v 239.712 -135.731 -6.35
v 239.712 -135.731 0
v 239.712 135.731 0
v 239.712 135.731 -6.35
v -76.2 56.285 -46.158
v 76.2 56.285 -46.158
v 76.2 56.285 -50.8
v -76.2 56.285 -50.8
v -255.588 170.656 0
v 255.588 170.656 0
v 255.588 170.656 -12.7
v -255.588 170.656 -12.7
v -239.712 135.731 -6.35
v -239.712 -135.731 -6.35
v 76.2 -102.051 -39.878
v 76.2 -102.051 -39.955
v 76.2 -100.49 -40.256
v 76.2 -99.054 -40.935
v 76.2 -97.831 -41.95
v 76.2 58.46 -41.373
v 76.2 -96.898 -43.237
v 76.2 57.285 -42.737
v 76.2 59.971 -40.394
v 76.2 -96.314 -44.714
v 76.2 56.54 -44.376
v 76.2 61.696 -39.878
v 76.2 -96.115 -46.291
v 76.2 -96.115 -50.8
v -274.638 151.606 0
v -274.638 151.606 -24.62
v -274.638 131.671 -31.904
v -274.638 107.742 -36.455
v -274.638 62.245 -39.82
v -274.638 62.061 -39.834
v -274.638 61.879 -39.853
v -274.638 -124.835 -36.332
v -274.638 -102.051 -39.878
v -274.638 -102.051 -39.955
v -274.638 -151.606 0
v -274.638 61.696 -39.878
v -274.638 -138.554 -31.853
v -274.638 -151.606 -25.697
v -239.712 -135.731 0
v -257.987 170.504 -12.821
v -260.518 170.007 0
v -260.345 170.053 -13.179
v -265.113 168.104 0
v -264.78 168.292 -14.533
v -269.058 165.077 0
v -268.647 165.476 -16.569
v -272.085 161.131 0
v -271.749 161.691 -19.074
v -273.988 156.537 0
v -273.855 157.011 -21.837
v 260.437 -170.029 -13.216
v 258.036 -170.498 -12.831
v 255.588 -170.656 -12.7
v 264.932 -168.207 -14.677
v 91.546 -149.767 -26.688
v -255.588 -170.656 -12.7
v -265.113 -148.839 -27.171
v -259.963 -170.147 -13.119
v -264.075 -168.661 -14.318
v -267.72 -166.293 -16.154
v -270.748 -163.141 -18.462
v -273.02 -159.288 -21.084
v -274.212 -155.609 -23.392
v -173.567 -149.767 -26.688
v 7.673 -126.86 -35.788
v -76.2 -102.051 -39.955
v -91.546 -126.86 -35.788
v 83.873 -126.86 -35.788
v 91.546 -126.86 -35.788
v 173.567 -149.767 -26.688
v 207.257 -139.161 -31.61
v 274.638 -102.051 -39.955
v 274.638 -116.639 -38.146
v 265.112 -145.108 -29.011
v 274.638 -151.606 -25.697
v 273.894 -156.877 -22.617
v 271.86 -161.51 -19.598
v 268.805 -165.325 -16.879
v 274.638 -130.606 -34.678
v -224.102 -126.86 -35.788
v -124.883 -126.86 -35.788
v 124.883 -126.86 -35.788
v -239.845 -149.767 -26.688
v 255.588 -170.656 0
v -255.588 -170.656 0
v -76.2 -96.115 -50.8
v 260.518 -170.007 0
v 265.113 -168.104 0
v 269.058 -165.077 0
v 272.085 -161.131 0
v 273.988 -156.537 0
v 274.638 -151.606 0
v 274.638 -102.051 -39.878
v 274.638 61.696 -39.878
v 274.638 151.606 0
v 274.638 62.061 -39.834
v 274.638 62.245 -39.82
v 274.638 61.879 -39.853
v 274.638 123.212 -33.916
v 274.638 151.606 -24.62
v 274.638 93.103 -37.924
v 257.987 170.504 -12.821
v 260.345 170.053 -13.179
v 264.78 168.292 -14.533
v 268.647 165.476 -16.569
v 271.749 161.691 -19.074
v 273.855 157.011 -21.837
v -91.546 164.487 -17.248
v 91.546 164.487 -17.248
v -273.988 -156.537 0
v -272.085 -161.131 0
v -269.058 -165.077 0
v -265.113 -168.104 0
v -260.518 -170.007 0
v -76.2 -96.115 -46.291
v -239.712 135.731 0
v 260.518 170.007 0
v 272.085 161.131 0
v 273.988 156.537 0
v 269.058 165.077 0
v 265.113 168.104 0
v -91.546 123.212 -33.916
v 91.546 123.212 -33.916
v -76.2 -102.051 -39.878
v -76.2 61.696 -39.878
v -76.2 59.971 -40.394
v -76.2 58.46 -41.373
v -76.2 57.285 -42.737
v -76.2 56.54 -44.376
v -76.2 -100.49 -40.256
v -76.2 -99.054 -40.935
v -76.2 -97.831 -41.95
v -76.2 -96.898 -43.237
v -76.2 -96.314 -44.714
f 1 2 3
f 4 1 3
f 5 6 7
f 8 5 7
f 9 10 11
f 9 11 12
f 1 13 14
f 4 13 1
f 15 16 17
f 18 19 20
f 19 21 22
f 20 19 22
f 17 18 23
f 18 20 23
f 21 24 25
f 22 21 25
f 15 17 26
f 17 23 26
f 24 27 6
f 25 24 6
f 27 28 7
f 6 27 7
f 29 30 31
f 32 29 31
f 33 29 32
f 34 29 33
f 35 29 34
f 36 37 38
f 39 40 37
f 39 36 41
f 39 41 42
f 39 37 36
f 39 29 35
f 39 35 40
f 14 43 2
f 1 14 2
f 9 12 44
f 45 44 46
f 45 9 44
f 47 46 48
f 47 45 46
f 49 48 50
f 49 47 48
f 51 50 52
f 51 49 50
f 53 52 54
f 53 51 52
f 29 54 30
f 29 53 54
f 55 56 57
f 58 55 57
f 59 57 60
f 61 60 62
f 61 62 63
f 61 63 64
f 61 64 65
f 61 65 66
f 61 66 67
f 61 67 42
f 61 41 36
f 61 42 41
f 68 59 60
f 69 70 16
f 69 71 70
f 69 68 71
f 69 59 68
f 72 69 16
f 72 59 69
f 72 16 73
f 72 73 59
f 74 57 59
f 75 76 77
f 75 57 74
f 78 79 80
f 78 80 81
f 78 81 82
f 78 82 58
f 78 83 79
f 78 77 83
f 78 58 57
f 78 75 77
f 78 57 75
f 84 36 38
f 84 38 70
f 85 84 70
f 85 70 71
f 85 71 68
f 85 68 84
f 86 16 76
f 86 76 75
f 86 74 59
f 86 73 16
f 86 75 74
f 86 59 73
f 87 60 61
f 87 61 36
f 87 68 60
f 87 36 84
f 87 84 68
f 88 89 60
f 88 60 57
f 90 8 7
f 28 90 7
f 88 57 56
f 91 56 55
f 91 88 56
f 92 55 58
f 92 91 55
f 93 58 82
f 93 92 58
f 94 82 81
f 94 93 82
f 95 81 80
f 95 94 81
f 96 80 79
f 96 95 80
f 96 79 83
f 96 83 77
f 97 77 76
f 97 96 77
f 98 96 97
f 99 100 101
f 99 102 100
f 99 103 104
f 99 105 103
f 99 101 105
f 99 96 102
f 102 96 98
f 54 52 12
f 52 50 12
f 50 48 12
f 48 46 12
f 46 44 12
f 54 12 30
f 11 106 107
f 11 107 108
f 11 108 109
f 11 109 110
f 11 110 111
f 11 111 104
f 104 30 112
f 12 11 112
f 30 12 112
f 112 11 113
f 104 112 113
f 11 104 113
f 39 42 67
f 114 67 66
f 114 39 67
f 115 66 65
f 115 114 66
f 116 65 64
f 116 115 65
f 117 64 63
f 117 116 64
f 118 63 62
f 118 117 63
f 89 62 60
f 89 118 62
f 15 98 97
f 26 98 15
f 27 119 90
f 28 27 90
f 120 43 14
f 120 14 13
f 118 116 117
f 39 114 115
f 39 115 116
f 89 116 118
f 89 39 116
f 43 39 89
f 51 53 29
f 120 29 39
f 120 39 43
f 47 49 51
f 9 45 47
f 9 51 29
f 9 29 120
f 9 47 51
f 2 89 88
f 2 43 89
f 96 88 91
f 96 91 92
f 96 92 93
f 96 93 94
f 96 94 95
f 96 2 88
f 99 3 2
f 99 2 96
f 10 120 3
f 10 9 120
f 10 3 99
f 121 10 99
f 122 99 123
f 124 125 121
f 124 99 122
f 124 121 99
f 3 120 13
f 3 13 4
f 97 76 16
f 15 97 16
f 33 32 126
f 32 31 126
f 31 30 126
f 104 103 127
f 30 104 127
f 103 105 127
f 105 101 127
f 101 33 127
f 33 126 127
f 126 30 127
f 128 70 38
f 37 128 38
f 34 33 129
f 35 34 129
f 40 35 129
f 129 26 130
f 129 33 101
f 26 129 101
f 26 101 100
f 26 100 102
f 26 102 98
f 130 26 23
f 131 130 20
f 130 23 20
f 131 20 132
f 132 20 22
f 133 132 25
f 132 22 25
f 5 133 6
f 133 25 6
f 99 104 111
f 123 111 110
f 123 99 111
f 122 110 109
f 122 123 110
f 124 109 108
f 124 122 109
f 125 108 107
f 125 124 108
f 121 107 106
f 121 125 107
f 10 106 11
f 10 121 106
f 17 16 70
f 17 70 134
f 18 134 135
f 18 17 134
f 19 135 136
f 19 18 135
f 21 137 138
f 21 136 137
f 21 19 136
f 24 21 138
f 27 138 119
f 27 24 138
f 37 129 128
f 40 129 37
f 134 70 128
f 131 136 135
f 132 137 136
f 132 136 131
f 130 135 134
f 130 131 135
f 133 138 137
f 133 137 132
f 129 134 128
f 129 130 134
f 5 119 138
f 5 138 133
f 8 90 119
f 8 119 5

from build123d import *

# Parameters (mm, degrees)
BOSS_EXTRUDE1_DEPTH = 50.8
SKETCH2_W           = 479.425
SKETCH2_H           = 271.4625
CUT_EXTRUDE1_DEPTH  = 6.35
CUT_EXTRUDE2_DEPTH  = 762
SKETCH6_W           = 198.4375
SKETCH6_H           = 164.295373215
CUT_EXTRUDE3_DEPTH  = 10.922


with BuildPart() as part:
    # Sketch1 → Boss-Extrude1 (new body)
    with BuildSketch(Plane.XY):
        with BuildLine():
            Line((-255.5875, -170.65625), (255.5875, -170.65625))
            ThreePointArc((255.5875, -170.65625), (269.057884182, -165.076634182), (274.6375, -151.60625))
            Line((274.6375, -151.60625), (274.6375, 151.60625))
            ThreePointArc((274.6375, 151.60625), (269.057884182, 165.076634182), (255.5875, 170.65625))
            Line((255.5875, 170.65625), (-255.5875, 170.65625))
            ThreePointArc((-255.5875, 170.65625), (-269.057884182, 165.076634182), (-274.6375, 151.60625))
            Line((-274.6375, 151.60625), (-274.6375, -151.60625))
            ThreePointArc((-274.6375, -151.60625), (-269.057884182, -165.076634182), (-255.5875, -170.65625))
        make_face()
    extrude(amount=-BOSS_EXTRUDE1_DEPTH)

    # Sketch2 → Cut-Extrude1 (cut)
    with BuildSketch(Plane.XY):
        Rectangle(SKETCH2_W, SKETCH2_H)
    extrude(amount=-CUT_EXTRUDE1_DEPTH, mode=Mode.SUBTRACT)

    # Sketch4 → Cut-Extrude2 (cut)
    with BuildSketch(Plane(origin=(274.6375, 0, 0), x_dir=(0, 0, -1), z_dir=(1, 0, 0))):
        with BuildLine():
            Line((50.8, 151.60625), (24.619980511, 151.60625))
            add(Edge.make_bspline(
                [(24.619980511, 151.60625), (37.620188453, 124.390887767), (37.919518366, 93.154889178), (39.820271532, 62.244773812)],
                knots=[0.12550099, 0.12550099, 0.12550099, 0.12550099, 0.642402298, 0.642402298, 0.642402298, 0.642402298], degree=3))
            ThreePointArc((39.820271532, 62.244773812), (41.808148642, 58.008646197), (46.158299596, 56.284517648))
            Line((46.158299596, 56.284517648), (50.8, 56.284517648))
            Line((50.8, 56.284517648), (50.8, 151.60625))
        make_face()
        with BuildLine():
            Line((50.8, 170.65625), (12.7, 170.65625))
            add(Edge.make_bspline(
                [(12.7, 170.65625), (17.558504138, 164.584737247), (21.463596597, 158.21400058), (24.619980511, 151.60625)],
                knots=[0, 0, 0, 0, 0.12550099, 0.12550099, 0.12550099, 0.12550099], degree=3))
            Line((24.619980511, 151.60625), (50.8, 151.60625))
            Line((50.8, 151.60625), (50.8, 170.65625))
        make_face()
        with BuildLine():
            Line((50.8, -96.115482352), (50.8, -170.65625))
            Line((50.8, -170.65625), (12.7, -170.65625))
            add(Edge.make_bspline(
                [(12.7, -170.65625), (29.115546881, -150.814752865), (38.270494448, -127.771718295), (39.954605231, -102.050599403)],
                knots=[0, 0, 0, 0, 0.929133929, 0.929133929, 0.929133929, 0.929133929], degree=3))
            ThreePointArc((39.954605231, -102.050599403), (41.950070115, -97.830991726), (46.291037361, -96.115482352))
            Line((46.291037361, -96.115482352), (50.8, -96.115482352))
        make_face()
    extrude(amount=-CUT_EXTRUDE2_DEPTH, mode=Mode.SUBTRACT)

    # Sketch6 → Cut-Extrude3 (cut)
    with BuildSketch(Plane(origin=(0, 0, -50.8), x_dir=(-1, 0, 0), z_dir=(0, 0, -1))):
        with Locations((-175.41875, -19.902912796)):
            Rectangle(SKETCH6_W, SKETCH6_H)
        with Locations((175.41875, -19.902912796)):
            Rectangle(SKETCH6_W, SKETCH6_H)
    extrude(amount=-CUT_EXTRUDE3_DEPTH, mode=Mode.SUBTRACT)


solid = part.part
